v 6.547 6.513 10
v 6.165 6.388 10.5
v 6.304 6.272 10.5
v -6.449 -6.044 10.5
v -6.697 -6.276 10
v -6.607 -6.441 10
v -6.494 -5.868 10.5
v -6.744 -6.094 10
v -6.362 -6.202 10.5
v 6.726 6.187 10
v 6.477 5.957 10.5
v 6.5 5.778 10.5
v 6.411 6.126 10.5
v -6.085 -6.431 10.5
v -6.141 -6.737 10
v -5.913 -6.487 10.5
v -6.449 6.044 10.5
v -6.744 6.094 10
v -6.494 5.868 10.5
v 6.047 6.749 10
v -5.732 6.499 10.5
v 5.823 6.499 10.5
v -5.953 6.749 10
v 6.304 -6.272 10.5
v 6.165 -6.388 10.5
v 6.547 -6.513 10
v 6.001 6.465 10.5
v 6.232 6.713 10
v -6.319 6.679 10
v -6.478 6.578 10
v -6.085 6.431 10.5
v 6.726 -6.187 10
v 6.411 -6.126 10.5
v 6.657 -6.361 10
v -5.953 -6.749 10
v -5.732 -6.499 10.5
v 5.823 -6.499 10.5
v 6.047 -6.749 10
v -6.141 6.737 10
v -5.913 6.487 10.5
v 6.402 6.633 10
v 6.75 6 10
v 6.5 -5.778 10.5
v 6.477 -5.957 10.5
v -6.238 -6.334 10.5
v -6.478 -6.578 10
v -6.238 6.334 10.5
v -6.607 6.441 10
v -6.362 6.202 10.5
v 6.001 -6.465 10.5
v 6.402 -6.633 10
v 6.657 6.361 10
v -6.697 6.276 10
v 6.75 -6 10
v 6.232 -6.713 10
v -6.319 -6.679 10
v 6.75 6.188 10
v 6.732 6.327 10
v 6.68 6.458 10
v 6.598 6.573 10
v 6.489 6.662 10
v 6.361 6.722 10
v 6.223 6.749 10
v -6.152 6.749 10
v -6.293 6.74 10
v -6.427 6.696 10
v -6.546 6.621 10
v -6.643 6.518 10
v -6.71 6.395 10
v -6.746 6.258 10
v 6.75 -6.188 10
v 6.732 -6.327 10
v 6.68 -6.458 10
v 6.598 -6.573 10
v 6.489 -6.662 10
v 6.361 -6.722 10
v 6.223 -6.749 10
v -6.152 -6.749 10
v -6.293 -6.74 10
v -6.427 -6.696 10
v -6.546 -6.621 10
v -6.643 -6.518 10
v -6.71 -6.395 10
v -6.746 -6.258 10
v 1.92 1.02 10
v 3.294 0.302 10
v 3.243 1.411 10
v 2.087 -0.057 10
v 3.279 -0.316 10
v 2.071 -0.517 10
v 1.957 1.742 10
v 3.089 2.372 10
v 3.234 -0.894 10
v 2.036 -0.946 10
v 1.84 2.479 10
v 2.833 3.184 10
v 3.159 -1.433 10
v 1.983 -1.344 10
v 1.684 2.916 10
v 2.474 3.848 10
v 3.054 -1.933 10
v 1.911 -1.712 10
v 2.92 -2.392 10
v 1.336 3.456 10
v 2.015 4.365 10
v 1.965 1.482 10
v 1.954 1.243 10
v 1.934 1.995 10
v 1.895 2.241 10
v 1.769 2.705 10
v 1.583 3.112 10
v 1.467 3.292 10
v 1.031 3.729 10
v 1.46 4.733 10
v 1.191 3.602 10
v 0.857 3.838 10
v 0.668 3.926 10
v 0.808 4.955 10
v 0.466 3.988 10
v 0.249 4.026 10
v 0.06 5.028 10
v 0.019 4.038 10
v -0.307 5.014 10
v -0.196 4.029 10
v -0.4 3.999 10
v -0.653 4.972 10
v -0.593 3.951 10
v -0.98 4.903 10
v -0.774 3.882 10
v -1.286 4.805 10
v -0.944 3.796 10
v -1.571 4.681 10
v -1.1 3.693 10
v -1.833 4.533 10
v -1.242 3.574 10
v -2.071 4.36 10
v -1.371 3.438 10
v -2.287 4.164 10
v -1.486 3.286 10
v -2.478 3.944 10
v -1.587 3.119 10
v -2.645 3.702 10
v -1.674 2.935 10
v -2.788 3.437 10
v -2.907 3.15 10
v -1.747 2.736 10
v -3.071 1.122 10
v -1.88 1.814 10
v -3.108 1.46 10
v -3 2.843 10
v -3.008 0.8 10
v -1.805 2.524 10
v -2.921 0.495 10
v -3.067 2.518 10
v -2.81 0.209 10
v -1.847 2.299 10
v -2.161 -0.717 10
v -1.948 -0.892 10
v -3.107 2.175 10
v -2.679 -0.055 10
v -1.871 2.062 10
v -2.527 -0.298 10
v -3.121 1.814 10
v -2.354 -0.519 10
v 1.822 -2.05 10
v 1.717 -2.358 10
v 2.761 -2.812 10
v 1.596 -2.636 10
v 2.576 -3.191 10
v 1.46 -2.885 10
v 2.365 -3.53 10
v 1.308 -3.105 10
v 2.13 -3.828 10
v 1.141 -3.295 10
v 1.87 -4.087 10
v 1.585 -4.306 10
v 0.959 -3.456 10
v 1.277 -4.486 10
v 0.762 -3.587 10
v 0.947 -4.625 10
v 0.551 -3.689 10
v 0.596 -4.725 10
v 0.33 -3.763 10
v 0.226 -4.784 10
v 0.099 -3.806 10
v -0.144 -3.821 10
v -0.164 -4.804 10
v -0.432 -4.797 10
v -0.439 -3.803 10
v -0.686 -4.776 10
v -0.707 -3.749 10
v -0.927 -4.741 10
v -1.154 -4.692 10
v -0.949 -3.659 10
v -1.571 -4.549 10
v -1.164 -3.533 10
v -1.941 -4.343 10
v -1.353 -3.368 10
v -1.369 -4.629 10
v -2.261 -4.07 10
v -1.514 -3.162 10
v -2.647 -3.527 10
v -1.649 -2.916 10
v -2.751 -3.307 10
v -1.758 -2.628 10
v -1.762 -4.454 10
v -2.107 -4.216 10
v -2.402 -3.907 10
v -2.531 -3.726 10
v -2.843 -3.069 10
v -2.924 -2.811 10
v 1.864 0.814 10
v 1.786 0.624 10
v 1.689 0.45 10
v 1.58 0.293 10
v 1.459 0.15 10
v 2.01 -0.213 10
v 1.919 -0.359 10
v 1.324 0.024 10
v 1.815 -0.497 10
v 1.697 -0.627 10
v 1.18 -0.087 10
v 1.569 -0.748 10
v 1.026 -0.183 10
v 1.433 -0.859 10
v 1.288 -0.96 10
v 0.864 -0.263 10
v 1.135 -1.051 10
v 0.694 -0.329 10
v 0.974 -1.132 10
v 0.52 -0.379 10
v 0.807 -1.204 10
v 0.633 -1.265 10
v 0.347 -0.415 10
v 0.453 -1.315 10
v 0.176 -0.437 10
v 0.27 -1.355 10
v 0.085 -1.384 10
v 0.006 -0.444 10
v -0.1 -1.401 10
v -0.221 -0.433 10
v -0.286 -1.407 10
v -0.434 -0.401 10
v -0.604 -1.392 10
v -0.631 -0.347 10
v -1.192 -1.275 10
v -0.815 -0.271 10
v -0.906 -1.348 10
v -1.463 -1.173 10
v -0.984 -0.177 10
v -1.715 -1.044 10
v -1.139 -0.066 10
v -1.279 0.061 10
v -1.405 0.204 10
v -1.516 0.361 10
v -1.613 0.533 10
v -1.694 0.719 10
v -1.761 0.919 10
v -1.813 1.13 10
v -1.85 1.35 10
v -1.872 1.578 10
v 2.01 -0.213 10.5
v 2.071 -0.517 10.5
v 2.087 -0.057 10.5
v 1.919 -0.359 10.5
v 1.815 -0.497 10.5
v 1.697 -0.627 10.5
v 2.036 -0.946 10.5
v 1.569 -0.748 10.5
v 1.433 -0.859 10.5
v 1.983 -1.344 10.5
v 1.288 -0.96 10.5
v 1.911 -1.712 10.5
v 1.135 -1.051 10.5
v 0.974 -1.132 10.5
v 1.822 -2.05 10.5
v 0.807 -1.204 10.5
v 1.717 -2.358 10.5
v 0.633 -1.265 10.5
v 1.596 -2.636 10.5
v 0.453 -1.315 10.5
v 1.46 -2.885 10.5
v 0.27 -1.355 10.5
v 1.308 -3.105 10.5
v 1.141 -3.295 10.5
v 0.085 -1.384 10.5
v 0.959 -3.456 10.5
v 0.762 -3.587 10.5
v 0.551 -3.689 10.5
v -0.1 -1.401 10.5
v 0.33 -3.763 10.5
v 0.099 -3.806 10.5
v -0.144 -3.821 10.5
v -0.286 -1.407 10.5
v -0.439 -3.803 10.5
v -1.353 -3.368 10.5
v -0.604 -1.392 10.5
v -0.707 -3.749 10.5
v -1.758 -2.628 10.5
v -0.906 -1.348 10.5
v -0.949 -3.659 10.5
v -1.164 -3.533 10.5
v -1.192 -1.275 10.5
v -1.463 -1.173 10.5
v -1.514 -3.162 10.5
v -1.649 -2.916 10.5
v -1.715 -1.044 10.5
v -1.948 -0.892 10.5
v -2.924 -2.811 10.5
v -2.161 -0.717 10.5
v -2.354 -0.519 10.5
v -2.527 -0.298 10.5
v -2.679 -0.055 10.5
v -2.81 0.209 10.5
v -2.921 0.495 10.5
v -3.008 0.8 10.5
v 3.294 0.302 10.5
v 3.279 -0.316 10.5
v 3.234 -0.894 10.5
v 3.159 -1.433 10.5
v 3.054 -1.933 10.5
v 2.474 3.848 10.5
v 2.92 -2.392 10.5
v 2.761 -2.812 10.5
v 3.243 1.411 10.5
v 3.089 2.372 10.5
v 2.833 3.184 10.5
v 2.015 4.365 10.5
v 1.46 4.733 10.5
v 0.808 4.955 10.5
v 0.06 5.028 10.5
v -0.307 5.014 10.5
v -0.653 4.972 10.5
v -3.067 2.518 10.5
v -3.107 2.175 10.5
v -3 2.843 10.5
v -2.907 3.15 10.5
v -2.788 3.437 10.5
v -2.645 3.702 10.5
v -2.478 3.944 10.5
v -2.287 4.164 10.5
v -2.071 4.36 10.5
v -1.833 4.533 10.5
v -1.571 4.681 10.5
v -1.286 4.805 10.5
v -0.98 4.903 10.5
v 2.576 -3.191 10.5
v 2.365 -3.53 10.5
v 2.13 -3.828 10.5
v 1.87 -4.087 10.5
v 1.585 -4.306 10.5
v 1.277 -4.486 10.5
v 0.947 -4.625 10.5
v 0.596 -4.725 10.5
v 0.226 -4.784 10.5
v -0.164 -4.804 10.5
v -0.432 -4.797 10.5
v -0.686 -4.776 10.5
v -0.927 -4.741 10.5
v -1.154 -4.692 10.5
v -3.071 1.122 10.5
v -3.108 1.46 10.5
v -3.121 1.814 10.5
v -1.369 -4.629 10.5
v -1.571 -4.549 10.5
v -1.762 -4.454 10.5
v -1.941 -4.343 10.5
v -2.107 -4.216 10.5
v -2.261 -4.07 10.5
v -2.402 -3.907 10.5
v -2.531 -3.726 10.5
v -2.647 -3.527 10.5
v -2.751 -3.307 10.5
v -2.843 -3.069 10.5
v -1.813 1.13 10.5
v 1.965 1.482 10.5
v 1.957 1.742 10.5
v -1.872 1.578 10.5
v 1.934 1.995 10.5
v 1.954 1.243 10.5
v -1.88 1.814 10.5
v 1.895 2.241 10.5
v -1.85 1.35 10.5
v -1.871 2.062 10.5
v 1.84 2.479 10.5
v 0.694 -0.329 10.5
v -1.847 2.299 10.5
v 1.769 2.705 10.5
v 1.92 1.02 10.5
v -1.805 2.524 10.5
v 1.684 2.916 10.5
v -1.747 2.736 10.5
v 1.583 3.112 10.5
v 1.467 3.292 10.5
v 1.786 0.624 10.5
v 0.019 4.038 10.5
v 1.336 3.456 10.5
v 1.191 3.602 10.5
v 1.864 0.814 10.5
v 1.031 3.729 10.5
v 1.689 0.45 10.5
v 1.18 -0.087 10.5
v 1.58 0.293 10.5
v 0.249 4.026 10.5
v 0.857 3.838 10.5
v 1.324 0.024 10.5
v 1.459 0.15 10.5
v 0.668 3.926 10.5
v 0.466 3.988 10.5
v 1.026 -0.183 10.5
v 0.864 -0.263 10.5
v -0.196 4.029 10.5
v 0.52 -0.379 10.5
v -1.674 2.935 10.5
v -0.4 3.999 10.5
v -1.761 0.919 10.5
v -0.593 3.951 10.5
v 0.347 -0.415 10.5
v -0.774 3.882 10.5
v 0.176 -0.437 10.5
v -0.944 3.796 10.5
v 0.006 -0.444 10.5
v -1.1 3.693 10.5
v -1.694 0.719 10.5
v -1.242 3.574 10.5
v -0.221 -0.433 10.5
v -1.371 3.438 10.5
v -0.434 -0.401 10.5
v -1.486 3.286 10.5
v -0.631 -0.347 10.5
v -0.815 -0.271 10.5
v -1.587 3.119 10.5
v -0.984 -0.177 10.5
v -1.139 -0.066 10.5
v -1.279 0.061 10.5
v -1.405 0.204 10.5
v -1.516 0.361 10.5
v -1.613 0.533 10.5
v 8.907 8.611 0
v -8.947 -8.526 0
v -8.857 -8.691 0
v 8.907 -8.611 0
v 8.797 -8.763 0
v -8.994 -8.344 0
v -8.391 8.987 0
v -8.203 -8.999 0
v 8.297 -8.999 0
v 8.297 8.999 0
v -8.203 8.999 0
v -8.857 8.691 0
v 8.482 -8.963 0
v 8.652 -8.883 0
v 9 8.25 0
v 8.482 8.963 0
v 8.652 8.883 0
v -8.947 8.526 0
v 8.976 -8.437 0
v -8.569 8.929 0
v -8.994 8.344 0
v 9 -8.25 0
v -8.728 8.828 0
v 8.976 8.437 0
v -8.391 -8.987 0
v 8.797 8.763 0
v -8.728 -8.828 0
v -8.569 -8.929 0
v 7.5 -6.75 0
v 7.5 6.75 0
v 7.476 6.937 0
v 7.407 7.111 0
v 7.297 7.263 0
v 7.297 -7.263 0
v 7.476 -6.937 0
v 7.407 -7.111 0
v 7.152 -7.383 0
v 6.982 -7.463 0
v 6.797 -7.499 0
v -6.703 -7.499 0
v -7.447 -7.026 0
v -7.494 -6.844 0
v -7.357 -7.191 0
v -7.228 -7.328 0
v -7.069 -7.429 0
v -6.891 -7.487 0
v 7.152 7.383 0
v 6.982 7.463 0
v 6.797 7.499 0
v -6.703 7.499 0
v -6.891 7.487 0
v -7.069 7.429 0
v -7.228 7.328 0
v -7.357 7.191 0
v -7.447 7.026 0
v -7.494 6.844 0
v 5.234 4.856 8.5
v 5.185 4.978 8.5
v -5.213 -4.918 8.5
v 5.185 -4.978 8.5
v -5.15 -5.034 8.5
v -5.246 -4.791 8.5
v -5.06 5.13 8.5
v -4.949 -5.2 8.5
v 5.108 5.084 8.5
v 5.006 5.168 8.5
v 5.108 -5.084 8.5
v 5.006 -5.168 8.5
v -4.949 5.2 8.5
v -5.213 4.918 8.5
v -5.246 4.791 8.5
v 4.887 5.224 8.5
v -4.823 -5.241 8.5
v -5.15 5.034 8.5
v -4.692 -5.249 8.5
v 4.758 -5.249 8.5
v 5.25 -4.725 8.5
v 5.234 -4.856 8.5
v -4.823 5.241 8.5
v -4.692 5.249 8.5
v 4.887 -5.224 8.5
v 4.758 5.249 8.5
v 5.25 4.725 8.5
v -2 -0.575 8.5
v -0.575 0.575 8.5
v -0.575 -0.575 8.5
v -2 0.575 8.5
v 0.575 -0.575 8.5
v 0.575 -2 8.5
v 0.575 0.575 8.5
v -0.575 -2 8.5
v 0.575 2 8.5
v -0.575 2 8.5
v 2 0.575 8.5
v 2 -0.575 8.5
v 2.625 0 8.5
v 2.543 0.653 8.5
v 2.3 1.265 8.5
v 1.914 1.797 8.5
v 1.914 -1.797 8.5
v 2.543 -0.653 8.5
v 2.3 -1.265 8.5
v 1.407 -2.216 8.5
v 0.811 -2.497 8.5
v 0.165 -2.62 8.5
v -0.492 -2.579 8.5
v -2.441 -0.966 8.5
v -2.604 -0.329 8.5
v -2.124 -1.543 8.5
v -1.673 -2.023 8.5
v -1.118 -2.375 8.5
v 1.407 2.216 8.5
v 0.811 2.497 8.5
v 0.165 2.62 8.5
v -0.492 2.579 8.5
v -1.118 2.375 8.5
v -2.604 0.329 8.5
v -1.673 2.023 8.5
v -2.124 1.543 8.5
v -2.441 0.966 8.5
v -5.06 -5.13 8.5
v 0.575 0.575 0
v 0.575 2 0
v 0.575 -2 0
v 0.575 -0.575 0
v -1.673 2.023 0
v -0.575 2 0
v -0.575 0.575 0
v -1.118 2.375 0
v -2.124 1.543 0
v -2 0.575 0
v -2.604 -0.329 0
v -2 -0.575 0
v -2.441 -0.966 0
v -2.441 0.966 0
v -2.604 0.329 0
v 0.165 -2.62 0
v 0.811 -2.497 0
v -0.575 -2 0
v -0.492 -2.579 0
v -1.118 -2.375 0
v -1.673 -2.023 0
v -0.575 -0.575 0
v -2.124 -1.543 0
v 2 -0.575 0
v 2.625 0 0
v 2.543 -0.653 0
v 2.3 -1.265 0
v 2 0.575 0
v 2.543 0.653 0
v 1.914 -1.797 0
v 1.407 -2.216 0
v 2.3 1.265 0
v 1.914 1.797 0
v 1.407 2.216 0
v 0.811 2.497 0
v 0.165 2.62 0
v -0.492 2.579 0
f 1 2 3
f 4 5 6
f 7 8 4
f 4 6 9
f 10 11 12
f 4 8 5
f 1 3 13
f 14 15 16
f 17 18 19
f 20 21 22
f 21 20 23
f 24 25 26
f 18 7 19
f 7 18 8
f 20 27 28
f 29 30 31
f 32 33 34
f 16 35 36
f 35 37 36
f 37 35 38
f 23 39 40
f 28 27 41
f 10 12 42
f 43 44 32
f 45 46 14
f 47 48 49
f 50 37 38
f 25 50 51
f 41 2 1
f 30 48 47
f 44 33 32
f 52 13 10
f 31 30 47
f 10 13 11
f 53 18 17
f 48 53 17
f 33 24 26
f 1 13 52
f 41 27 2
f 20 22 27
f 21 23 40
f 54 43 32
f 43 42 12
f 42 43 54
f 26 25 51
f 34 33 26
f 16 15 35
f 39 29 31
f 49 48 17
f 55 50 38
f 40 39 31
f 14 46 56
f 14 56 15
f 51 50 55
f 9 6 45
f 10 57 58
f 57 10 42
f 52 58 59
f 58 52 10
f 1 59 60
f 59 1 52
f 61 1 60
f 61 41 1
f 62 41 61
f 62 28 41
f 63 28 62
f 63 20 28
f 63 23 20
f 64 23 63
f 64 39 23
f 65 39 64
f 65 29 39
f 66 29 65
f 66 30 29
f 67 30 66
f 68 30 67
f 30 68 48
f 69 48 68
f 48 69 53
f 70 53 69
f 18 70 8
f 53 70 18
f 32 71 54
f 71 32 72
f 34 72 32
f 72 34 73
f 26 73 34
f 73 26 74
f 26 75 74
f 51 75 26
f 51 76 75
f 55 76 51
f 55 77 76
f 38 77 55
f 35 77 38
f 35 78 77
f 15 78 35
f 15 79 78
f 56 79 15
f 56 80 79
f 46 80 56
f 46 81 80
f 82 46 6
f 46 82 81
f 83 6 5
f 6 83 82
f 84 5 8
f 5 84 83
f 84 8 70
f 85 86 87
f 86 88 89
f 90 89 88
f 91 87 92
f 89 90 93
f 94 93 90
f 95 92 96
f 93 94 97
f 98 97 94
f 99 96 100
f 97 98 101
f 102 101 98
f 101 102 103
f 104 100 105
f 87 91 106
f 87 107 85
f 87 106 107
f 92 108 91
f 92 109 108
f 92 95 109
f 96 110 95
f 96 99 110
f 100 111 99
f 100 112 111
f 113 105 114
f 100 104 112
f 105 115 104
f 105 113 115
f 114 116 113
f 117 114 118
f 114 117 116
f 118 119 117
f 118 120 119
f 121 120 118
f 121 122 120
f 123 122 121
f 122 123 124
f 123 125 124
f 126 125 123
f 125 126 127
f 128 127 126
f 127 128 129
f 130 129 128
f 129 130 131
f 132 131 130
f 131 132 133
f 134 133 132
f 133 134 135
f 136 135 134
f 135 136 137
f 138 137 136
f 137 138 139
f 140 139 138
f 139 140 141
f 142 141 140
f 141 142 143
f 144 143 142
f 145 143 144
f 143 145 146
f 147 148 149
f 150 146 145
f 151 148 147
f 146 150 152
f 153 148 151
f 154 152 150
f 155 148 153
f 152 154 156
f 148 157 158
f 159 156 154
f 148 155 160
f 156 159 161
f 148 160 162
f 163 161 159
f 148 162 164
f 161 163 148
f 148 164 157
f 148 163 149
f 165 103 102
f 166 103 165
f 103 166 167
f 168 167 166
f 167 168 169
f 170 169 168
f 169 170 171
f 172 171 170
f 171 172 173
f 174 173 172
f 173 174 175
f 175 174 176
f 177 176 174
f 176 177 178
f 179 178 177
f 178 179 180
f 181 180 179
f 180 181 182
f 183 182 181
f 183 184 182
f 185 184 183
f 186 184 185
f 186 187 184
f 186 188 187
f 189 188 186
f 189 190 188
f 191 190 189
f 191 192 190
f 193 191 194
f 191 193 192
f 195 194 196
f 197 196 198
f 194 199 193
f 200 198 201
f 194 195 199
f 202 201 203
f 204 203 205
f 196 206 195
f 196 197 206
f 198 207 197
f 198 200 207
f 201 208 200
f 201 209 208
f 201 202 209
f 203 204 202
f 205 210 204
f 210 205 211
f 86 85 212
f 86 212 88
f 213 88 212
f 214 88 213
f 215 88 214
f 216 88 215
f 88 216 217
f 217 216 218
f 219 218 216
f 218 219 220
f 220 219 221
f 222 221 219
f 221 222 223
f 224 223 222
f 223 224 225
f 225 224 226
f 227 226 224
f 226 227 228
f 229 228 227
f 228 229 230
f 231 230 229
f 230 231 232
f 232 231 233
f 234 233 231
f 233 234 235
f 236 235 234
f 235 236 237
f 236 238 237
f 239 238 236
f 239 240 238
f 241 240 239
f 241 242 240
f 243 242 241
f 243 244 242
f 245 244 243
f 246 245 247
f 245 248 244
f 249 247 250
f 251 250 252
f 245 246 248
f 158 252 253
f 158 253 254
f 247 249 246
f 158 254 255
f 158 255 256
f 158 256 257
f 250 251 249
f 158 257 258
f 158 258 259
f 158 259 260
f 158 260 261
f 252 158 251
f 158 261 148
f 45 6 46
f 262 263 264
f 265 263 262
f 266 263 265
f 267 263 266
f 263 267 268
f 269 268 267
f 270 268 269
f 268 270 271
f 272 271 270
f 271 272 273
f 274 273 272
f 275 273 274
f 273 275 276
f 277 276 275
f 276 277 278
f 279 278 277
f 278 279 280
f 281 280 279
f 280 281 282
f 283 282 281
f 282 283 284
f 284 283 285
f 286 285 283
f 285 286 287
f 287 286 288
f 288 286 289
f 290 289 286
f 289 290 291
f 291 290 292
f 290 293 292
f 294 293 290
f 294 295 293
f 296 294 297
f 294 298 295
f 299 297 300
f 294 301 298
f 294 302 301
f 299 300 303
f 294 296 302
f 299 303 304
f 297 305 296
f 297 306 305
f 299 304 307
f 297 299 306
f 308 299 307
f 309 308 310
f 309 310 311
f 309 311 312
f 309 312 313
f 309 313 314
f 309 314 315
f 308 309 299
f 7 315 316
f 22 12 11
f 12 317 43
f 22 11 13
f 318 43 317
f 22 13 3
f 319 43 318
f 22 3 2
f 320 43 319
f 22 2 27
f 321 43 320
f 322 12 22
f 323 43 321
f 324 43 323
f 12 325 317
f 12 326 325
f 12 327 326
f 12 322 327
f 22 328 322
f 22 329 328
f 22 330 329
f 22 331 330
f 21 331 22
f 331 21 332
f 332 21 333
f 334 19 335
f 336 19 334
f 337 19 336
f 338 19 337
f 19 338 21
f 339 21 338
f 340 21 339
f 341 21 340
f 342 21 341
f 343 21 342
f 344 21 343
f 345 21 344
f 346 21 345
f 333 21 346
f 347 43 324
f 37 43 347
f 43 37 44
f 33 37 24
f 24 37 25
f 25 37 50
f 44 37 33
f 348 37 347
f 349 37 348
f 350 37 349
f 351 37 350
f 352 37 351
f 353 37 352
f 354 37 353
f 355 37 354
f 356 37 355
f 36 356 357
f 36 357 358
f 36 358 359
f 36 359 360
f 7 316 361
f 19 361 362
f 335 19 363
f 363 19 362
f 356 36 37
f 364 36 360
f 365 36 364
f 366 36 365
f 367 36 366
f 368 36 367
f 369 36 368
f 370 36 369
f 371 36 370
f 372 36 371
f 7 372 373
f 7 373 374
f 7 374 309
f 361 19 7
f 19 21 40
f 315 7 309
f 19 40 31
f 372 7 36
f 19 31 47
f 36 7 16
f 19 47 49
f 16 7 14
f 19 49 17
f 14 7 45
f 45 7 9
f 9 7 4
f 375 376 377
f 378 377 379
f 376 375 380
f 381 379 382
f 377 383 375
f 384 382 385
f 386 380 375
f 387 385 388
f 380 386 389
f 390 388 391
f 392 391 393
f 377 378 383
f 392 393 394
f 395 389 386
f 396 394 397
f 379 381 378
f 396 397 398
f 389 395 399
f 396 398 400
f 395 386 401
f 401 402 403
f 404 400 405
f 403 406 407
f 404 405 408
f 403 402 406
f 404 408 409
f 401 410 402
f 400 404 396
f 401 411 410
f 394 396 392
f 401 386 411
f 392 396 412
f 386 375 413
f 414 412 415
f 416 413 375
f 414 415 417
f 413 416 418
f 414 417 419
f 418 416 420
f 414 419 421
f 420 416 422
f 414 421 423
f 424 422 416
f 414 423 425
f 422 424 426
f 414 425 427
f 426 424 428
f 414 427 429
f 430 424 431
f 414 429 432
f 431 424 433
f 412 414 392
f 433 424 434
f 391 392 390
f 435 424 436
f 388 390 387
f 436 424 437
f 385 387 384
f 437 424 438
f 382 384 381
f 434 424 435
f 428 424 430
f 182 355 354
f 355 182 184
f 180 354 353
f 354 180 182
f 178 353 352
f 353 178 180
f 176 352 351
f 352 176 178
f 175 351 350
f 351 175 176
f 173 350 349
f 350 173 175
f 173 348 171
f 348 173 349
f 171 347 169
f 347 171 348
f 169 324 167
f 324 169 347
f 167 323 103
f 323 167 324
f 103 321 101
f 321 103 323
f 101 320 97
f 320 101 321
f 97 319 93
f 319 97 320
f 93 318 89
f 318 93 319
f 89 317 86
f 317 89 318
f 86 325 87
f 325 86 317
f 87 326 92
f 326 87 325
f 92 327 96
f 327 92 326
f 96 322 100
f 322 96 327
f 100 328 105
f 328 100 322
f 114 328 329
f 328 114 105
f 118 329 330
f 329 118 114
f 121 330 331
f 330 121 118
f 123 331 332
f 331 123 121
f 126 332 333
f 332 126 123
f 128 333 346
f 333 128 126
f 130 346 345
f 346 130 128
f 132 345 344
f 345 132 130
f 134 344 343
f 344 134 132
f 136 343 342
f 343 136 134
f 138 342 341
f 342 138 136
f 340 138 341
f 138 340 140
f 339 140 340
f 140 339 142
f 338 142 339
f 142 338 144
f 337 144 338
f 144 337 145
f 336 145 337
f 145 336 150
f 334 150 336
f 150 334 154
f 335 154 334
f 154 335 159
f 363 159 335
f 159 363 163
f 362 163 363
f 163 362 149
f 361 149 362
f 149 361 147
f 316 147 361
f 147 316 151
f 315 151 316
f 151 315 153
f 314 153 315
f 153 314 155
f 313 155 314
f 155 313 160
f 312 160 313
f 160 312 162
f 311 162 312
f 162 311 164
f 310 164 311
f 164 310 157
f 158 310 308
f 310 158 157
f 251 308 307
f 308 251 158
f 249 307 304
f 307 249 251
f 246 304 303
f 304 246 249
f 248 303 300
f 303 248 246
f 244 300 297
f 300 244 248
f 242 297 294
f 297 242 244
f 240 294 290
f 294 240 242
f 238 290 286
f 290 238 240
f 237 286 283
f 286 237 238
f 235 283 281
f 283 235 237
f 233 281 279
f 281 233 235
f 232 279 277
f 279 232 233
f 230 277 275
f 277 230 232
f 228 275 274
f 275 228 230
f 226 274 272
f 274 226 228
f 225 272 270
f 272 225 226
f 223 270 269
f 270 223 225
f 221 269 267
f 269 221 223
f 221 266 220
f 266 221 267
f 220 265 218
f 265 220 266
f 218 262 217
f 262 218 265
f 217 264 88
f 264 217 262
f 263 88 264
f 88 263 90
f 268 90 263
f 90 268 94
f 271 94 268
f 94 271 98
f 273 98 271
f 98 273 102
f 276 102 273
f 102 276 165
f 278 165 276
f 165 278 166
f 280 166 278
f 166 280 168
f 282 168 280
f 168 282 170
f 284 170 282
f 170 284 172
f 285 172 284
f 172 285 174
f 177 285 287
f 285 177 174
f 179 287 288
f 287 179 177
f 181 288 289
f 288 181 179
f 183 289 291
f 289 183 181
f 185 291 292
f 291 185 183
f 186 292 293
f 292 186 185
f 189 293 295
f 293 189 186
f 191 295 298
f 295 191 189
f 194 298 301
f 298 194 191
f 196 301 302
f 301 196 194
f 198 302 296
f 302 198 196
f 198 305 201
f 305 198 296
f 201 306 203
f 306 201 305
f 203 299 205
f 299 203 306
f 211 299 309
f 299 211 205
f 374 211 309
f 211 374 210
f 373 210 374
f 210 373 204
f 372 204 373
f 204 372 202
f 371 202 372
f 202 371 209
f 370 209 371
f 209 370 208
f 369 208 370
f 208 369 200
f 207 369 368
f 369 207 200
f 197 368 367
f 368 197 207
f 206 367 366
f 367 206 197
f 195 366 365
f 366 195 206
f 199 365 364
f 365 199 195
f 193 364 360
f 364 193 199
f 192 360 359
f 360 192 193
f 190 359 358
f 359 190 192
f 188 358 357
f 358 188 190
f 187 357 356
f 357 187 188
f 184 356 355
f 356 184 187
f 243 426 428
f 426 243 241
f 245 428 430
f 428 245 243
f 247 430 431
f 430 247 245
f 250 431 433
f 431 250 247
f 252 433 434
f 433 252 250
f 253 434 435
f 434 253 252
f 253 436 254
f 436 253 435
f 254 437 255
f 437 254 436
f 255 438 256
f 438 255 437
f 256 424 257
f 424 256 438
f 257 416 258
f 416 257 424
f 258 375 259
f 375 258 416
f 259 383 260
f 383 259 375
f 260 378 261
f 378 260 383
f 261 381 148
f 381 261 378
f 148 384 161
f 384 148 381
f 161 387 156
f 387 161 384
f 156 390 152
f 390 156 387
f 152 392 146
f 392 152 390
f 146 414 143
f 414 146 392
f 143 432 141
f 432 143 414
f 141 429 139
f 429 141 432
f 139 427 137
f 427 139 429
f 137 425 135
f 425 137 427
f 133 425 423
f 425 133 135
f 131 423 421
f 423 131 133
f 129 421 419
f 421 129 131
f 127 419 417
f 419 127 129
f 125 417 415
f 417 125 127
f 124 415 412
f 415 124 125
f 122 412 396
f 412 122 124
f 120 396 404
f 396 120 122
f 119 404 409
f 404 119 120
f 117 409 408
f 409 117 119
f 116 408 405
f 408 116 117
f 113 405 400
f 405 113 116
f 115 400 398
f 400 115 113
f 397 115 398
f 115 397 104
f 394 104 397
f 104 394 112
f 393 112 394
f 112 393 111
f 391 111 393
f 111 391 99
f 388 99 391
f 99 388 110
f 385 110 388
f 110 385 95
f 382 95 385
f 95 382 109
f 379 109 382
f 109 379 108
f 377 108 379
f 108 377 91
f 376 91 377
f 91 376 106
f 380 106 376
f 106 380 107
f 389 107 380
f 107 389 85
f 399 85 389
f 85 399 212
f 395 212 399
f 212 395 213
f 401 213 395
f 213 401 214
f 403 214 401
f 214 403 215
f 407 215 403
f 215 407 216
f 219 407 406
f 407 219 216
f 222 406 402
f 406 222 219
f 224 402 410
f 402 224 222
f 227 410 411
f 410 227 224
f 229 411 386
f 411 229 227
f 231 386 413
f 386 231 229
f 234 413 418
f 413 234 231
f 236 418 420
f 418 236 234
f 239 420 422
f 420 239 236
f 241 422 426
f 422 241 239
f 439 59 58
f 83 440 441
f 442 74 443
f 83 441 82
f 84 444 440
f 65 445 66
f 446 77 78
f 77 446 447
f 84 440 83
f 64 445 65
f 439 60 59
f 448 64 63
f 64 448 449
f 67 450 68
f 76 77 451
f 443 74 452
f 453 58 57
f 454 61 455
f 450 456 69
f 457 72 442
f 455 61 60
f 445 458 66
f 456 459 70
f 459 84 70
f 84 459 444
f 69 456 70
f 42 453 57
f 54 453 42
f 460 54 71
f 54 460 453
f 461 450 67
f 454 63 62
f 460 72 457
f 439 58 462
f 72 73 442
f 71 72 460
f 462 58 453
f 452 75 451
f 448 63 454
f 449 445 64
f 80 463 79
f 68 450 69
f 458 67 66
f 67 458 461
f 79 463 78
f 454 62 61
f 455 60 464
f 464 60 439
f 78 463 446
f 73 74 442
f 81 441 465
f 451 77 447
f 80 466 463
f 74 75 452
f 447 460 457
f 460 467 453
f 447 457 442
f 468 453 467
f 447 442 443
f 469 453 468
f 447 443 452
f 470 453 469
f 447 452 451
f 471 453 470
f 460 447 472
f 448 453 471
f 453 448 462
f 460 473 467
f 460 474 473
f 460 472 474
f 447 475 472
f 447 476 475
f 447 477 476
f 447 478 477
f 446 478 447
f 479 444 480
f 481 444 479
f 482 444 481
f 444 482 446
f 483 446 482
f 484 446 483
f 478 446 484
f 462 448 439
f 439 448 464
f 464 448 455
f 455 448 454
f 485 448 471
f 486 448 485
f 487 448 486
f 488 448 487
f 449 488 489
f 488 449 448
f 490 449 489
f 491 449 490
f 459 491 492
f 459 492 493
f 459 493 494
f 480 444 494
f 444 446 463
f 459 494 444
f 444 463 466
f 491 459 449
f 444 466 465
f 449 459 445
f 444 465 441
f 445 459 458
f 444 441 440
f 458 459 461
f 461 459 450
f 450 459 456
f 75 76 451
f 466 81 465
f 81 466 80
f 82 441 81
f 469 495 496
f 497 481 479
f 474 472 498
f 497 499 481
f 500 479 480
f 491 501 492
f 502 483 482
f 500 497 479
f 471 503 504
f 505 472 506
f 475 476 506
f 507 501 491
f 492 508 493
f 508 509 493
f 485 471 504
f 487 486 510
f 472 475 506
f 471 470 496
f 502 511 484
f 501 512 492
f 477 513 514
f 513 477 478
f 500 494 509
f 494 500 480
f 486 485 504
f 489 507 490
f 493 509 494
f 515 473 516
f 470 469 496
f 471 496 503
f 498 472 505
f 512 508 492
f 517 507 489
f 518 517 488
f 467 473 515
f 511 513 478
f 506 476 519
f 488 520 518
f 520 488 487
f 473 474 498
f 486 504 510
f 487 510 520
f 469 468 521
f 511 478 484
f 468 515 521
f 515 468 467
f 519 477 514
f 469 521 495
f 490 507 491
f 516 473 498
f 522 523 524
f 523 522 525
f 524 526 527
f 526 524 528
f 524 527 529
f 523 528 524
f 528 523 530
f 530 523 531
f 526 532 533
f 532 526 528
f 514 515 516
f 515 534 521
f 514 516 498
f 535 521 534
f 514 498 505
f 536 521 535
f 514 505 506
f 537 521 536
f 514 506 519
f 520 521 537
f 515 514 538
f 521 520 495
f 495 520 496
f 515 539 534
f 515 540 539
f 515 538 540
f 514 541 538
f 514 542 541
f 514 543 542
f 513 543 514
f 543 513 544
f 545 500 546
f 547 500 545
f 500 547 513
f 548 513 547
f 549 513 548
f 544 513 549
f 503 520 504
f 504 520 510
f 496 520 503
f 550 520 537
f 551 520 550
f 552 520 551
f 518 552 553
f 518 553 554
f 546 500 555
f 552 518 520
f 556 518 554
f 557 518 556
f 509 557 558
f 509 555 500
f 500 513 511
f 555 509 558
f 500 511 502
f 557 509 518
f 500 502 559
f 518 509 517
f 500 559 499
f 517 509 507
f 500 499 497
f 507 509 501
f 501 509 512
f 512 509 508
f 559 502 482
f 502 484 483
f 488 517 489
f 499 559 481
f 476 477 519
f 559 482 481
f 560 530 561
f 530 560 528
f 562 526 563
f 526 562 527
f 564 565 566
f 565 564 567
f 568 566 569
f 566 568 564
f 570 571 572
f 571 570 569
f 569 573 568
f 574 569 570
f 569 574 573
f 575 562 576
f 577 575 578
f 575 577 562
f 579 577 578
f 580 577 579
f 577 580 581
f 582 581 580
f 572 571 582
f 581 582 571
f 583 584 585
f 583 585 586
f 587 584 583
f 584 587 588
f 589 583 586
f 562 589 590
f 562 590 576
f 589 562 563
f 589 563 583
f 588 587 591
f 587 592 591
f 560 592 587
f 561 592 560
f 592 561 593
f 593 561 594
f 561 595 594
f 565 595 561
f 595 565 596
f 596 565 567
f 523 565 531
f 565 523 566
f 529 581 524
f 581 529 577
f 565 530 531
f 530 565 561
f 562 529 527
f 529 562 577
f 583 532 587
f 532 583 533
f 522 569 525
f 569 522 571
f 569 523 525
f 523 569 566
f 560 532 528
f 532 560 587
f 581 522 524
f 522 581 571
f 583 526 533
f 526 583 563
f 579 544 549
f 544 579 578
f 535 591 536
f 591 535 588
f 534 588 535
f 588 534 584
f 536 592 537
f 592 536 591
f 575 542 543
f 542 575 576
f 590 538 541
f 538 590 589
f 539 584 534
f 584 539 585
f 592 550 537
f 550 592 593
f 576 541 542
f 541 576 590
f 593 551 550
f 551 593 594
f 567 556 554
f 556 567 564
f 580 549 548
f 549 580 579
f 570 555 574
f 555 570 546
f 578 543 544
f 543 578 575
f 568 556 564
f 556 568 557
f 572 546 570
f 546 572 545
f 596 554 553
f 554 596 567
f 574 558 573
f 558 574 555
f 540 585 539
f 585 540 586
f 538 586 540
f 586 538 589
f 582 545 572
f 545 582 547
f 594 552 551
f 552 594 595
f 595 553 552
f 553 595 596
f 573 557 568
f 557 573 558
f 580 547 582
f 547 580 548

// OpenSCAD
$fn=25;

Outside_Width=18;
Outside_Height=10;
Spindle_Diameter=5.25;
Line_Width=1.15;
Line_Length=4;
Wall_Thickness=1.5;
Top_Width=13.5;
Symbol_Thickness=0.5;
Key_Symbol="9";


// Top Layer
translate([0,0,Outside_Height])
difference(){
Capshape(Symbol_Thickness,Top_Width,Wall_Thickness,Top_Width-Symbol_Thickness);
// Symbol on Key Cap
linear_extrude(height=Symbol_Thickness)
text(Key_Symbol,valign="center",halign="center");
}

// Basic Cap Shape
difference(){
Capshape(Outside_Height,Outside_Width,Wall_Thickness,Top_Width);
// Hollow it out
Capshape(Outside_Height-Wall_Thickness,Outside_Width-Wall_Thickness*2,Wall_Thickness,Top_Width-Wall_Thickness*2);
}

difference(){
// Spindle
cylinder(h=Outside_Height,d=Spindle_Diameter);
// Slots
union(){
translate([Line_Width/-2,Line_Length/-2,0])
cube([Line_Width,Line_Length,Outside_Height-Wall_Thickness]);
translate([Line_Length/-2,Line_Width/-2,0])
cube([Line_Length,Line_Width,Outside_Height-Wall_Thickness]);
}
}


module Capshape(Height,Width,Thickness,Top){
linear_extrude(height=Height,scale=Top/Width){
translate([0-Width/2,0-Width/2,0]){
hull(){
translate([Thickness/2,Thickness/2,0])
circle(d=Thickness);
translate([Width-Thickness/2,Thickness/2,0])
circle(d=Thickness);
translate([Width-Thickness/2,Width-Thickness/2,0])
circle(d=Thickness);
translate([Thickness/2,Width-Thickness/2,0])
circle(d=Thickness);
}
}
}
}
